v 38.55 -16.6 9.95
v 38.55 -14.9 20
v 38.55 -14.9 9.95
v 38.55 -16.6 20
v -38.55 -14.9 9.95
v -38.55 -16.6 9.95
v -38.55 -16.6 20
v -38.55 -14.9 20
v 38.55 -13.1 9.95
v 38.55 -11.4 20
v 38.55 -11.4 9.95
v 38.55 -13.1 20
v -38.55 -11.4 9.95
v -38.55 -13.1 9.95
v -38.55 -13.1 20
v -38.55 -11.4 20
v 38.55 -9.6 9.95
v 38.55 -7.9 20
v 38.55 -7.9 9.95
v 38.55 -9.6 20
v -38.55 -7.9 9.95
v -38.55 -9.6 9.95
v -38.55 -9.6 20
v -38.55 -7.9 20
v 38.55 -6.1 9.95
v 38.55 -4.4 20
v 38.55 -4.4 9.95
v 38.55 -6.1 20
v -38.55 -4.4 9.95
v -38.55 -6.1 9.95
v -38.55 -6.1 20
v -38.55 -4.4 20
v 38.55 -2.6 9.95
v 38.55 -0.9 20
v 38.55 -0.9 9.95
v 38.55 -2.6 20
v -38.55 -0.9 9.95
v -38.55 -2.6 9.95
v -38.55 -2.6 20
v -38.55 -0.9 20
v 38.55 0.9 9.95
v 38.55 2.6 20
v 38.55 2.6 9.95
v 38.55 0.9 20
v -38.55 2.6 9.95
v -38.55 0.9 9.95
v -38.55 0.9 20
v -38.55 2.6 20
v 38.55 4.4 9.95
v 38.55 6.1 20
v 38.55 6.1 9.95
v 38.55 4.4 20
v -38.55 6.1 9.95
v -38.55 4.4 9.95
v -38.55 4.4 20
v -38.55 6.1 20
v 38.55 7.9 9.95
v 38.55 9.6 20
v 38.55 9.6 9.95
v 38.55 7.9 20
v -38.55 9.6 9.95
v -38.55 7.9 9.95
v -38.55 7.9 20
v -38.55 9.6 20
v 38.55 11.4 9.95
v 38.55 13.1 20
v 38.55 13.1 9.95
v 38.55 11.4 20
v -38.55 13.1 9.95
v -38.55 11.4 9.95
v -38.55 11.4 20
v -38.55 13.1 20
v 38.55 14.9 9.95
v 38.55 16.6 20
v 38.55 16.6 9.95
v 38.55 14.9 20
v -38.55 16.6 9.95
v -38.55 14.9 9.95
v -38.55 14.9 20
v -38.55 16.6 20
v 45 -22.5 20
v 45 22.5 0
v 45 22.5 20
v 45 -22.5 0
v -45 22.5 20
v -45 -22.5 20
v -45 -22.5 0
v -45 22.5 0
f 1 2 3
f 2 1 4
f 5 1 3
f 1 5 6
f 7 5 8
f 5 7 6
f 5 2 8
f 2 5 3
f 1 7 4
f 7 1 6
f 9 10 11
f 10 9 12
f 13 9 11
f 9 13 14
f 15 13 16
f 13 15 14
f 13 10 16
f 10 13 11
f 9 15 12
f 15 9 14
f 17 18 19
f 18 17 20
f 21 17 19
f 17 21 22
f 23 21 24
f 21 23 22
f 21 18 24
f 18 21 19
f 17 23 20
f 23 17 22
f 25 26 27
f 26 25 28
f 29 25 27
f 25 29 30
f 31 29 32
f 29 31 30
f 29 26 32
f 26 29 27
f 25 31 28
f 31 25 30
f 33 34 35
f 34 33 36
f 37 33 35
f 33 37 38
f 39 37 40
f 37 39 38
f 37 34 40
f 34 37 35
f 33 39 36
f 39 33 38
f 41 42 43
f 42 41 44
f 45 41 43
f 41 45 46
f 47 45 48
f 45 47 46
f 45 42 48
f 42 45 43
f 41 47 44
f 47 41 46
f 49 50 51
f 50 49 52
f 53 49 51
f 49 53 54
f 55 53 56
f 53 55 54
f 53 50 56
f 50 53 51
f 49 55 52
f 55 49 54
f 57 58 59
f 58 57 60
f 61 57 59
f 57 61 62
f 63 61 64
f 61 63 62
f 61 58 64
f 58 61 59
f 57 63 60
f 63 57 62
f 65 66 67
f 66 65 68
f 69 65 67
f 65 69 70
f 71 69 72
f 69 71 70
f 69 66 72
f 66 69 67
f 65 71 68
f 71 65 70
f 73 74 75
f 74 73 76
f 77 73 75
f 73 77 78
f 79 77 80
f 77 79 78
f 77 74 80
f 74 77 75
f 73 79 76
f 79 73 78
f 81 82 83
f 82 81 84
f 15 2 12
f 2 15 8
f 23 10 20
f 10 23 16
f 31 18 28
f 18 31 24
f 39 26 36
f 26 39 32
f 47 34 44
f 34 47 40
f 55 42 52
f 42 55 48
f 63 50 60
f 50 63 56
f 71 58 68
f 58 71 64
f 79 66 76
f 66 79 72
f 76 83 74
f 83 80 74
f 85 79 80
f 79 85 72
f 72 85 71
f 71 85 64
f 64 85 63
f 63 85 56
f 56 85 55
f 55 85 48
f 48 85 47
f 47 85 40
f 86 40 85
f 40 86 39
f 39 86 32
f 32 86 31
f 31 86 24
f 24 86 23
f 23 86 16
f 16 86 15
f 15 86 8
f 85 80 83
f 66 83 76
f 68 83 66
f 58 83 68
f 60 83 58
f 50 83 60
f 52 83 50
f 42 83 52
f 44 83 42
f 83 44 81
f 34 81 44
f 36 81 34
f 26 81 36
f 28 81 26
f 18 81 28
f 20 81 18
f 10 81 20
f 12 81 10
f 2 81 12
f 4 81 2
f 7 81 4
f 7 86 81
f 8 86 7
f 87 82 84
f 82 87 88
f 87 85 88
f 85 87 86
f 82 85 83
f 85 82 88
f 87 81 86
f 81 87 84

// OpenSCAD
// Dimensions for the drying rack
base_length = 90;      // X dimension of the base block
base_width = 45;       // Y dimension of the base block
base_height = 20;      // Z dimension of the base block

// Slot dimensions
slot_length = 77;      // Length of the slot (X direction)
slot_width = 1.6;      // Width of the slot (Y direction)
slot_depth = 10;       // Depth of the slot (Z direction)

// Slot arrangement
num_slots = 10;        // Number of slots
slot_pitch = 3.5;      // Centre-to-centre distance between slots (Y direction)

// Safety margin for boolean operations to ensure clean cuts
cut_extend = 0.05;

$fn = 64;

// The base block rests on the XY plane (z=0) and builds upward.
// Centered in X and Y.
module base_block() {
    // Cube centered at (0,0, base_height/2) so it sits on z=0
    translate([0, 0, base_height / 2]) {
        cube([base_length, base_width, base_height], center = true);
    }
}

// Module to define a single slot cut
// y_center: The Y coordinate of the center of the slot
module slot_cut(y_center) {
    // Slot runs along X, centered at X=0
    // X range: -slot_length/2 to +slot_length/2
    // Extend slightly past the faces for clean boolean subtraction
    x_half = slot_length / 2 + cut_extend;
    
    // Slot width is along Y, centered at y_center
    // Y range: y_center - slot_width/2 to y_center + slot_width/2
    y_half = slot_width / 2 + cut_extend;
    
    // Slot depth is along Z.
    // Top of block is at Z = base_height.
    // Slot goes down slot_depth from the top.
    // So the cut goes from Z = base_height down to Z = base_height - slot_depth.
    // We extend slightly past the bottom of the slot (into the solid) and past the top (into the air)
    // to ensure the top face is cleanly open.
    z_top = base_height + cut_extend;
    z_bottom = base_height - slot_depth - cut_extend;
    
    // Calculate center Z of the cut volume
    z_center = (z_top + z_bottom) / 2;
    
    // Define the cutting volume
    // Size in X
    size_x = 2 * x_half;
    // Size in Y
    size_y = 2 * y_half;
    // Size in Z
    size_z = z_top - z_bottom;
    
    translate([0, y_center, z_center]) {
        cube([size_x, size_y, size_z], center = true);
    }
}

module drying_rack() {
    difference() {
        base_block();
        
        // Generate 10 slots
        // The slots are centred on the block in Y.
        // For an even number of slots (10), the centers are at:
        // +/- 0.5 * pitch, +/- 1.5 * pitch, ..., +/- 4.5 * pitch
        // Formula: y_i = (i - (num_slots - 1) / 2) * pitch
        // where i goes from 0 to num_slots - 1
        
        for (i = [0 : num_slots - 1]) {
            y_c = (i - (num_slots - 1) / 2) * slot_pitch;
            slot_cut(y_c);
        }
    }
}

drying_rack();
